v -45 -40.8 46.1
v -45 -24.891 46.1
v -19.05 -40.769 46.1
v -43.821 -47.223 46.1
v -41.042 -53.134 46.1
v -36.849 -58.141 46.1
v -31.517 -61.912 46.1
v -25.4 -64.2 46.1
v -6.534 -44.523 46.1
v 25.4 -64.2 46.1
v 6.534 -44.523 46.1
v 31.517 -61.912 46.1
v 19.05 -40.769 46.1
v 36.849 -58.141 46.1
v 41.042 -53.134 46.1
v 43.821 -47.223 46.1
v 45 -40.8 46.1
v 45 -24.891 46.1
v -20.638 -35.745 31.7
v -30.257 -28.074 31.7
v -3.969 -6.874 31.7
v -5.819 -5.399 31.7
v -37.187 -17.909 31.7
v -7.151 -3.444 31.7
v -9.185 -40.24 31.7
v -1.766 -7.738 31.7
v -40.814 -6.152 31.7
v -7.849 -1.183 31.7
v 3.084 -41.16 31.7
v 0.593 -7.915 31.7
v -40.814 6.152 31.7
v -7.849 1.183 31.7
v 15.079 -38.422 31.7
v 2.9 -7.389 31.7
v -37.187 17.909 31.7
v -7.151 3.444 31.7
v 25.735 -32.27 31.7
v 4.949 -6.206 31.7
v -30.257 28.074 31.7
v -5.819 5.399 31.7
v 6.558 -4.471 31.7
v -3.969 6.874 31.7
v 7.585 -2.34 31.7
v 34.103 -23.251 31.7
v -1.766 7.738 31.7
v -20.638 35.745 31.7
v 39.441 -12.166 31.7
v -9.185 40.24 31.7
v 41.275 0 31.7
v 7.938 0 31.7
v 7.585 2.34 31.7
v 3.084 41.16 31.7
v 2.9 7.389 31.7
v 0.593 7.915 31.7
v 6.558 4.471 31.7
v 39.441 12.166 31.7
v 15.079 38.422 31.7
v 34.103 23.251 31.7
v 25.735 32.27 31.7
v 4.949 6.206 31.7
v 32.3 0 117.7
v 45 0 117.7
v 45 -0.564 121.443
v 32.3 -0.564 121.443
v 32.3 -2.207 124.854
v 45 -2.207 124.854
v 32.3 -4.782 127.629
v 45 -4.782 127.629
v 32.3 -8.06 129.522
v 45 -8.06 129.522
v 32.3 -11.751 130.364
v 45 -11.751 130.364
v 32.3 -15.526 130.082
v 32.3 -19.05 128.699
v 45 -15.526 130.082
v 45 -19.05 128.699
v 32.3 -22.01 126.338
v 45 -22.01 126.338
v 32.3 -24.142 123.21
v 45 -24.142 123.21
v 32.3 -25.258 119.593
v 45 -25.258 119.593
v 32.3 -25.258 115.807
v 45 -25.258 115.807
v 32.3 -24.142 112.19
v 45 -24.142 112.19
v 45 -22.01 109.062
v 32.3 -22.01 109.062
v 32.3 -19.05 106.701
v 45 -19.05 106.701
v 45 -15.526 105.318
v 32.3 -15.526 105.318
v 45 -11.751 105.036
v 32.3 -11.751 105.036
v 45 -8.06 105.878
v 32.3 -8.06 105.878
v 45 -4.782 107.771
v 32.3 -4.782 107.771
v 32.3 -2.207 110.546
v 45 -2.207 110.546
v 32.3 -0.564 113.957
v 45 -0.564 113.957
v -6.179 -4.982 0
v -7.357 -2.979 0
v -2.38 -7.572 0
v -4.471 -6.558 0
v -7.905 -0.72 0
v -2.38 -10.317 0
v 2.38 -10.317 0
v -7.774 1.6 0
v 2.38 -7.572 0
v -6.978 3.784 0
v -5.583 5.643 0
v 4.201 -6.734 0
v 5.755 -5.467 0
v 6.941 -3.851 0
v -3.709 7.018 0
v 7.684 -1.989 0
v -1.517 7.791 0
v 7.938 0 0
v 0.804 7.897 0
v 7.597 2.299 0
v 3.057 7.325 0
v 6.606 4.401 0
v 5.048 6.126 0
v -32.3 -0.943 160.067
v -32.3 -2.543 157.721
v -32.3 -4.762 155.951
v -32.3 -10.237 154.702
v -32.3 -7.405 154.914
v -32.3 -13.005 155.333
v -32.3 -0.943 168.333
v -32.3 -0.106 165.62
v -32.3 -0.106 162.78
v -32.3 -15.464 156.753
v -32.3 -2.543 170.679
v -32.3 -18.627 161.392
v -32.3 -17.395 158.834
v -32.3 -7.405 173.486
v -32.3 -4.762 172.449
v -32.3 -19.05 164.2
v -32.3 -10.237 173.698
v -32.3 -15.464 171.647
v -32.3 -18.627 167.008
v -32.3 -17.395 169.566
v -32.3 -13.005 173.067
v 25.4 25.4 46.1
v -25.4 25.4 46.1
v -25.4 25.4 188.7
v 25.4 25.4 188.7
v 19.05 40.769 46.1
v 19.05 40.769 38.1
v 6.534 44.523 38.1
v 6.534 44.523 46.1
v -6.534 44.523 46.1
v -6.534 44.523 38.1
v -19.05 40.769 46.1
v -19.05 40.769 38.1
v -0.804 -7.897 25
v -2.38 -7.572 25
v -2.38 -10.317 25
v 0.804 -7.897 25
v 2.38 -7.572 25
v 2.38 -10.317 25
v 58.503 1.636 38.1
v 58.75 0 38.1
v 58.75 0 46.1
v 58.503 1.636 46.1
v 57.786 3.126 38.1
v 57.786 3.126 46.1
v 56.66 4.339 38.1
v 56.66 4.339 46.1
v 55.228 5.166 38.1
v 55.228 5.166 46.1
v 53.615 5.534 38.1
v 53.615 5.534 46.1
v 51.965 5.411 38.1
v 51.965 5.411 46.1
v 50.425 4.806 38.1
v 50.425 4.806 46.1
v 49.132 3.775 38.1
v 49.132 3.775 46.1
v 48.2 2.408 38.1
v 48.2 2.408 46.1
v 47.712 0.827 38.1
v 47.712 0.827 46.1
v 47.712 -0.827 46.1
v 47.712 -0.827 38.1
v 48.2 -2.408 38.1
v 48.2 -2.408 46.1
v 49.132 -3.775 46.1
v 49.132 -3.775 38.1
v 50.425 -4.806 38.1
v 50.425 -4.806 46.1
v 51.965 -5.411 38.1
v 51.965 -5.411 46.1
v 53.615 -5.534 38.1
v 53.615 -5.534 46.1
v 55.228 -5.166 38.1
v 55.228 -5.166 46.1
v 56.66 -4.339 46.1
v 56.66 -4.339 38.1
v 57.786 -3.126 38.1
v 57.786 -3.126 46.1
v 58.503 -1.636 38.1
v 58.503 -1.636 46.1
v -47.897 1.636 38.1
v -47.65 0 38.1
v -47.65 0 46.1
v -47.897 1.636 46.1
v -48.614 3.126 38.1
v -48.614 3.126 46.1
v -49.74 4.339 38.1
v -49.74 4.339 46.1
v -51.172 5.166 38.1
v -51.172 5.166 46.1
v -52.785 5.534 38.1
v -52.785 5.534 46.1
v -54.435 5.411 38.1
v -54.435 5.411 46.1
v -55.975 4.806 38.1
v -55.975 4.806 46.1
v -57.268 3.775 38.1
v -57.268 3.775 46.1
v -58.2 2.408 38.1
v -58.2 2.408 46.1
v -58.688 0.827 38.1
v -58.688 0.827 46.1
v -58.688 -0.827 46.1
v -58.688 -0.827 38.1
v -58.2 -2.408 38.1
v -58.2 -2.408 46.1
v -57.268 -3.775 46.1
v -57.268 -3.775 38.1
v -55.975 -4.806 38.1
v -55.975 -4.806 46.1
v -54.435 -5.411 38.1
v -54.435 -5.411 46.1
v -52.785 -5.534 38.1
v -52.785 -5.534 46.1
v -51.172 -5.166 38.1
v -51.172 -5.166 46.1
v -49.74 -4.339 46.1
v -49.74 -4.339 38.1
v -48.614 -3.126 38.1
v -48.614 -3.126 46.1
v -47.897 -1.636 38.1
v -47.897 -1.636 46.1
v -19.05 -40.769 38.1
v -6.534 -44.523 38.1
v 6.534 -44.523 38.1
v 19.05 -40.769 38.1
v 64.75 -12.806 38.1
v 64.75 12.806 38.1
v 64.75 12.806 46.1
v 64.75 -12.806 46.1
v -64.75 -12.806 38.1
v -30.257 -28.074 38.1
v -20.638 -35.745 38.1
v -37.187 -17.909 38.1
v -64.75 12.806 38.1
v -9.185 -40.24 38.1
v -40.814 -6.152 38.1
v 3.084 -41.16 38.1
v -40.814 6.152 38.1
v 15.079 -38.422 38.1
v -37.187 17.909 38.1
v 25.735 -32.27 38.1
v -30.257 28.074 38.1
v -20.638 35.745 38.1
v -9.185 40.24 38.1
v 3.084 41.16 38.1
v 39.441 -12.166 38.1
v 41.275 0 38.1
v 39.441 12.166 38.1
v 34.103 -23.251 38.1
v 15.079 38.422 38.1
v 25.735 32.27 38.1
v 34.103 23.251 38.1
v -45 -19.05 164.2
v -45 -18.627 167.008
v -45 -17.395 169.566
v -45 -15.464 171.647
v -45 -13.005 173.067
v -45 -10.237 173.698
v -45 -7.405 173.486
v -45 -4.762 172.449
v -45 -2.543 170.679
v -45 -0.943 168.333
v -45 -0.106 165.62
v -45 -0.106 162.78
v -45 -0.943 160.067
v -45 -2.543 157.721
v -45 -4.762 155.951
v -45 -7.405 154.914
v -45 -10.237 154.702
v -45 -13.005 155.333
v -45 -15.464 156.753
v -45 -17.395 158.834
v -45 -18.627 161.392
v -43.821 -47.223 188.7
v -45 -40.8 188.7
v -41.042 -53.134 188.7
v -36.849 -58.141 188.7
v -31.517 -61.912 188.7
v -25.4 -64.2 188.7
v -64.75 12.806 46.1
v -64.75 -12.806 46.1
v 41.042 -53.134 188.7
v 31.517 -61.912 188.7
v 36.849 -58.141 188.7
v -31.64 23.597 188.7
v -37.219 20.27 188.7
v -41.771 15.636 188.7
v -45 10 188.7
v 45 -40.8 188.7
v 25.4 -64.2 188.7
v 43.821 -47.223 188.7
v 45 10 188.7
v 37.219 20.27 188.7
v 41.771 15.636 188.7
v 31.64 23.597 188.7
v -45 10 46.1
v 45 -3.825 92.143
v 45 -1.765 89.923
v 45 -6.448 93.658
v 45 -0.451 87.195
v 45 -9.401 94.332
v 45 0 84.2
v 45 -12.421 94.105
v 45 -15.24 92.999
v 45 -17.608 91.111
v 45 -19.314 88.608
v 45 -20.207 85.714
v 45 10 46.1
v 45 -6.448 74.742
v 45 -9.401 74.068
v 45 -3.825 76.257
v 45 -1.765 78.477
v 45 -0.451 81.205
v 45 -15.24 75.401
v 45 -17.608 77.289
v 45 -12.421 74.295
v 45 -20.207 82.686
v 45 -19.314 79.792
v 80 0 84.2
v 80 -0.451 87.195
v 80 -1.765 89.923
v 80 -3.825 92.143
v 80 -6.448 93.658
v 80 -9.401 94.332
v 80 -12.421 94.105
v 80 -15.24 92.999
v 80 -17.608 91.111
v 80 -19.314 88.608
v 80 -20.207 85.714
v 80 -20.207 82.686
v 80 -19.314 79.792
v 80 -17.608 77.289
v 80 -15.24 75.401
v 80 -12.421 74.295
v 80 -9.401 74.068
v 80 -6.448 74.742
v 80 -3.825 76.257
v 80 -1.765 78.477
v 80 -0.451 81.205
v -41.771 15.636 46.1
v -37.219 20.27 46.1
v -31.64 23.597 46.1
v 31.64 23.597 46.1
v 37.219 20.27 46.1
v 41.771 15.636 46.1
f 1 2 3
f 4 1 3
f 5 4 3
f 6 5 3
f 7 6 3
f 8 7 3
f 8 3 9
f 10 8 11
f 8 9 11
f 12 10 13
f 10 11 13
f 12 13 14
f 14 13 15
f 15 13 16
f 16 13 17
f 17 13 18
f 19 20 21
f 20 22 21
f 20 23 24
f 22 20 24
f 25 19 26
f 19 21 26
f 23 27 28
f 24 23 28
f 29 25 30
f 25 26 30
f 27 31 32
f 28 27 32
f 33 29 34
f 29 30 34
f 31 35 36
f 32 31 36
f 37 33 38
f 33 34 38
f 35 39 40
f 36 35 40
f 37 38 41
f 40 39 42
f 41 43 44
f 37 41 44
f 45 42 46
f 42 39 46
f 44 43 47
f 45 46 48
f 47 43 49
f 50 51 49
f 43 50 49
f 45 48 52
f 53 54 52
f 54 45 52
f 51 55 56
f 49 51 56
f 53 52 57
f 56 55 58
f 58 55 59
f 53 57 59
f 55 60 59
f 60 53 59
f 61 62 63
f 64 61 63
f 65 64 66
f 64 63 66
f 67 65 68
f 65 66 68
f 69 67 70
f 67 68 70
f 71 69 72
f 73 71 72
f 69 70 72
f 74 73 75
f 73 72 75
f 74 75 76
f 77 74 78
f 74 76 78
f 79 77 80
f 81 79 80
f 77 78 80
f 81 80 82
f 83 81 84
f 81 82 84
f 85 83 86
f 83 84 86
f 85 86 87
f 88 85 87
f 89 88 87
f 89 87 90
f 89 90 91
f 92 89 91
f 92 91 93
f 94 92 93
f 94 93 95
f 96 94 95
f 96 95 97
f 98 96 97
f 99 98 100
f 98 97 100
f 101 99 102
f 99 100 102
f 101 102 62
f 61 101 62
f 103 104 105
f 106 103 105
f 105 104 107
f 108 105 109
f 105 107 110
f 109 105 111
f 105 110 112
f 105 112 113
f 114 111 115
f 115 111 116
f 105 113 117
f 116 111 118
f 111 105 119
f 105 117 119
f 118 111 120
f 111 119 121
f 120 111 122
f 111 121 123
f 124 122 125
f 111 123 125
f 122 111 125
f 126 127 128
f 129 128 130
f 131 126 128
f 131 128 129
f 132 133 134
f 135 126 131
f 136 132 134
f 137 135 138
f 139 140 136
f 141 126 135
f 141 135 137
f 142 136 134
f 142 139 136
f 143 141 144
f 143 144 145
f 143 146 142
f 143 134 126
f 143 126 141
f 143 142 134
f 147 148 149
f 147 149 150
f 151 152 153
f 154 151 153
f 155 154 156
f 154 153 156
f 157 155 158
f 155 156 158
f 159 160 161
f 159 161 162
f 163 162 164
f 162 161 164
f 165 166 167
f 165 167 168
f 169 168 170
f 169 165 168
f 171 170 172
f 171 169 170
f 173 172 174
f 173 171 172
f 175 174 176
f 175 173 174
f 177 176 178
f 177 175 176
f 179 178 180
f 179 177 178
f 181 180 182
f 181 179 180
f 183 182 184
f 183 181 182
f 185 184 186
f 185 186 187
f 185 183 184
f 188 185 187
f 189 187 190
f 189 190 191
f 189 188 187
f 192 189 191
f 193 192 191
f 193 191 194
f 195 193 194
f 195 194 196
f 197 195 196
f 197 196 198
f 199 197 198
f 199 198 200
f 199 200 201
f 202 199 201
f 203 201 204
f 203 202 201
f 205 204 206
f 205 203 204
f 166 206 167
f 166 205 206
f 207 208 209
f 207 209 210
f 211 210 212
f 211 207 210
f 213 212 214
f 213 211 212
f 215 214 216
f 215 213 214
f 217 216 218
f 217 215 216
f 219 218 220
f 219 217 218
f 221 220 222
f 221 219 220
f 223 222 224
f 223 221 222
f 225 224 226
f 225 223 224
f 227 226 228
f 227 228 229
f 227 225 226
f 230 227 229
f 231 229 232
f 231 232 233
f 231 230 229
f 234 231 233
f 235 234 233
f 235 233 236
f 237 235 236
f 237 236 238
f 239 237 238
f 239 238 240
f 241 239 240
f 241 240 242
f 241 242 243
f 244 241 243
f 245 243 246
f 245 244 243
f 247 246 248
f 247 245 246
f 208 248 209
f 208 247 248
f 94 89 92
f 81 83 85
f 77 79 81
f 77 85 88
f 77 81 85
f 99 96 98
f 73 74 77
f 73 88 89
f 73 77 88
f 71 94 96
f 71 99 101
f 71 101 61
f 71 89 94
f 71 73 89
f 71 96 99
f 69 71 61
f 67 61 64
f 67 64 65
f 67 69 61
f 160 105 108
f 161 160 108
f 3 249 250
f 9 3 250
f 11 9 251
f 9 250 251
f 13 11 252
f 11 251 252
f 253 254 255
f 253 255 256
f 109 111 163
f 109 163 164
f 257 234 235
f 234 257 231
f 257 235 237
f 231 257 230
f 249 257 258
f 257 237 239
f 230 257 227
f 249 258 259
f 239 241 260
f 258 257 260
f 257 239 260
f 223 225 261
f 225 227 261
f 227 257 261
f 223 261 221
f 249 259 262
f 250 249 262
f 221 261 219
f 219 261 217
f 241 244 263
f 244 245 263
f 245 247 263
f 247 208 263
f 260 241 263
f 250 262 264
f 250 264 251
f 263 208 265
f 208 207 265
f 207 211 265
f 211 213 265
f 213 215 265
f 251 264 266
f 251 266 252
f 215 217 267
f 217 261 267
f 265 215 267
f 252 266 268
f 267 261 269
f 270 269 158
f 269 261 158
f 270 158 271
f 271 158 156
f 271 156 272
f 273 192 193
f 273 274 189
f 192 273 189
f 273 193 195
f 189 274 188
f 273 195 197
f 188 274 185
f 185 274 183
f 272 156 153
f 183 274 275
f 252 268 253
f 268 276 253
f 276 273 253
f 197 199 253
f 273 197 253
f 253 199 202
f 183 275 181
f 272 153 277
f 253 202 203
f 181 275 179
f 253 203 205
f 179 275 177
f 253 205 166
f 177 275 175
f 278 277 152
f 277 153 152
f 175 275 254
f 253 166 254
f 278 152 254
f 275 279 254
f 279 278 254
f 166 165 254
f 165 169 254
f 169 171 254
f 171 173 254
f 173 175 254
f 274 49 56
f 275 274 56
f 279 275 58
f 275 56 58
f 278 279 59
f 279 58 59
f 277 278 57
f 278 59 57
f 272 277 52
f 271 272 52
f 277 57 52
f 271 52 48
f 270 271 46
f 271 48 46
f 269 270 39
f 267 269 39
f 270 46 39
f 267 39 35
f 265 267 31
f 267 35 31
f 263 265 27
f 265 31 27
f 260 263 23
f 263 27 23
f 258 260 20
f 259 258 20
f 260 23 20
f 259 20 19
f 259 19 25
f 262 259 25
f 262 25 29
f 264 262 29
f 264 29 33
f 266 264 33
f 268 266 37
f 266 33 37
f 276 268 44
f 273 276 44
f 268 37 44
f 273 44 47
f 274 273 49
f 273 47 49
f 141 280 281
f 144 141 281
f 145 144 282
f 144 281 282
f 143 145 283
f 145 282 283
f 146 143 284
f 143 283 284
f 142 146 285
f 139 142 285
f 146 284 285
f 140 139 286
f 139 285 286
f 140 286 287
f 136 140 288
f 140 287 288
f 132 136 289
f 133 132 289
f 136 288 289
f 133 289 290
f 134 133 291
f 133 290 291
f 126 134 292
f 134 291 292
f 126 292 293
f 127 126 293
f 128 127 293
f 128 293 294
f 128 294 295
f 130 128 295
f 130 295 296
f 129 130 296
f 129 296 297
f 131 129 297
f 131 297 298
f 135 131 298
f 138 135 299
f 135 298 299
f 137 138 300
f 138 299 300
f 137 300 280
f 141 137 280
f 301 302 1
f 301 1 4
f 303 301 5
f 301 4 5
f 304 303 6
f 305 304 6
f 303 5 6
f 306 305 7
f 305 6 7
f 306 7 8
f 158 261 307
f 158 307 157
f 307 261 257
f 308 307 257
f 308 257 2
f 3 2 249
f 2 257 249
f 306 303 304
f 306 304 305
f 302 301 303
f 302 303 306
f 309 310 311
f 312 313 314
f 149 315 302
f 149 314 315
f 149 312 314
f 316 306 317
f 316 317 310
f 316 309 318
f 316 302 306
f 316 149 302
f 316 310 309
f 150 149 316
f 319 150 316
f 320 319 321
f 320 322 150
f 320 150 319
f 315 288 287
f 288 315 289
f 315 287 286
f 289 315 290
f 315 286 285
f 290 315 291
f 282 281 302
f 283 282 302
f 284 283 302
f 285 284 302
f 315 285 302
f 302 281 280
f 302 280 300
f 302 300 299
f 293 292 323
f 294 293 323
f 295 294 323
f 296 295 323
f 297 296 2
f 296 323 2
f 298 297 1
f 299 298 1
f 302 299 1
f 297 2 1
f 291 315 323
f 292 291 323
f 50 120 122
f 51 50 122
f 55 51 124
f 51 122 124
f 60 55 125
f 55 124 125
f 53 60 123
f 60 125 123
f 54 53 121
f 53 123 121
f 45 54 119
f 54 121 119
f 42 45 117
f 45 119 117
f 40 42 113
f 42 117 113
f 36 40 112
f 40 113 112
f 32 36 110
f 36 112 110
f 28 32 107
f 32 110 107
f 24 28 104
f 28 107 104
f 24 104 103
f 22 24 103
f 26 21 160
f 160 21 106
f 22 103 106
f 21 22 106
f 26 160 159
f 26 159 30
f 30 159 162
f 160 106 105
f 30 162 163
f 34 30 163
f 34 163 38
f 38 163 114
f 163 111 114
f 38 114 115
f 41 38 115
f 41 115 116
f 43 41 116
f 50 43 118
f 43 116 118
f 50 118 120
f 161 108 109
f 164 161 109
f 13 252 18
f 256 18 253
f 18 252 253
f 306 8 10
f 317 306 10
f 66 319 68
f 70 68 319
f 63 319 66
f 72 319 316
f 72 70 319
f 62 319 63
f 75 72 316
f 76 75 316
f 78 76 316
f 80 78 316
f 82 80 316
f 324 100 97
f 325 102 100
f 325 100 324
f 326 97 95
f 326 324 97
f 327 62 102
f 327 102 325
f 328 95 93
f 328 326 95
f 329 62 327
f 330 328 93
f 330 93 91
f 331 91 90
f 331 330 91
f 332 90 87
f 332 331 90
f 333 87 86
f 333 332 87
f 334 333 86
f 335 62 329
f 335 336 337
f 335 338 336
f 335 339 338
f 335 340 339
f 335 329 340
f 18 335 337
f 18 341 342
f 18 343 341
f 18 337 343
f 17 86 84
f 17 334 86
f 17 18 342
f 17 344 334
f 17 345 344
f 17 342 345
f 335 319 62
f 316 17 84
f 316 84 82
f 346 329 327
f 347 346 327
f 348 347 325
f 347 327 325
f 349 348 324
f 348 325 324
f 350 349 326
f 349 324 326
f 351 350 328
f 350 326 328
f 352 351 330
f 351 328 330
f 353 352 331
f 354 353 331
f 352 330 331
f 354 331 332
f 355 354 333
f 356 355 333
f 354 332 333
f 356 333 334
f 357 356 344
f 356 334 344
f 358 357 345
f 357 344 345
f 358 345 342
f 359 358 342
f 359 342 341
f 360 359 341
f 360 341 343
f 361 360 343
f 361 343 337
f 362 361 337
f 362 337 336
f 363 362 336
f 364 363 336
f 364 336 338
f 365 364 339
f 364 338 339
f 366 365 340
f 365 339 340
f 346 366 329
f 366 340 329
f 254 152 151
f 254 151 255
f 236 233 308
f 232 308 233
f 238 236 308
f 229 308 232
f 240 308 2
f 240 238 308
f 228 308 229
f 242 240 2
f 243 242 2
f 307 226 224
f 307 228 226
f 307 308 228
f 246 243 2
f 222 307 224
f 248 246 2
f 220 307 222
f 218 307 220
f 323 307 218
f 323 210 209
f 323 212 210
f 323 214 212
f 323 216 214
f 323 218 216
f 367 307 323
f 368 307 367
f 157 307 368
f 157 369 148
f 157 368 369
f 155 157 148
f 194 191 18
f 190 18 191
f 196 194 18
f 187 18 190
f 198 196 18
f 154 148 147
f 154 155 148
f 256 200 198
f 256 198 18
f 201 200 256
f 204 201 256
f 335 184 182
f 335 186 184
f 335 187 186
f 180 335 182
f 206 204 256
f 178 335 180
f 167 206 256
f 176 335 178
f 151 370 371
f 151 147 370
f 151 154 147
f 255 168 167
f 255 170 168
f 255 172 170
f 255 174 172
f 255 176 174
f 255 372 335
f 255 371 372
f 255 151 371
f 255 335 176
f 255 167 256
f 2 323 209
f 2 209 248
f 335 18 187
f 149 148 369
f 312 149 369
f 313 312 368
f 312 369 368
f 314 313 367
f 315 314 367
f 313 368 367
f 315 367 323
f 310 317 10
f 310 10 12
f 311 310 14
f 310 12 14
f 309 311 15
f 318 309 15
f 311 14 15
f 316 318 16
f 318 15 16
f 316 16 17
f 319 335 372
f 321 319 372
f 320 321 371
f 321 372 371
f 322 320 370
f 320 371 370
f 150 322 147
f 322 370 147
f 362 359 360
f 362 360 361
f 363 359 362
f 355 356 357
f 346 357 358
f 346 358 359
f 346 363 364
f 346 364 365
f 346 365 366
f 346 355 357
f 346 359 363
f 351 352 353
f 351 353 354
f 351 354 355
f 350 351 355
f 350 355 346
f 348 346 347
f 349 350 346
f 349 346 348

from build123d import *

# Parameters (mm, degrees)
SKETCH_R        = 7.9375
PAD_DEPTH       = 31.7
SKETCH001_W     = 4.76
SKETCH001_H     = 4.76
PAD001_DEPTH    = 25
SKETCH002_R     = 41.275
PAD002_DEPTH    = 6.4
SKETCH003_R     = 5.55
PAD003_DEPTH    = 8
PAD004_DEPTH    = 142.6
SKETCH005_R     = 12.7
POCKET_DEPTH    = 12.7
SKETCH006_R     = 10.16
PAD005_DEPTH    = 35
SKETCH007_R     = 9.525
POCKET001_DEPTH = 12.7


with BuildPart() as part:
    # Sketch → Pad (new body)
    with BuildSketch(Plane.XY):
        Circle(SKETCH_R)
    extrude(amount=PAD_DEPTH)

    # Sketch001 → Pad001 (new body)
    with BuildSketch(Plane(origin=(0, 0, 0), x_dir=(1, 0, 0), z_dir=(0, 0, -1))):
        with Locations((0, 7.9375)):
            Rectangle(SKETCH001_W, SKETCH001_H)
    extrude(amount=-PAD001_DEPTH)

    # Sketch002 → Pad002 (new body)
    with BuildSketch(Plane.XY.offset(31.7)):
        Circle(SKETCH002_R)
    extrude(amount=PAD002_DEPTH)

    # Sketch003 → Pad003 (new body)
    with BuildSketch(Plane.XY.offset(38.1)):
        with BuildLine():
            Line((-64.75, 12.806207), (-64.75, -12.806207))
            Line((-64.75, -12.806207), (-19.05, -40.76883))
            ThreePointArc((-19.05, -40.76883), (0, -45), (19.05, -40.76883))
            Line((19.05, -40.76883), (64.75, -12.806207))
            Line((64.75, 12.806207), (64.75, -12.806207))
            Line((19.05, 40.76883), (64.75, 12.806207))
            ThreePointArc((19.05, 40.76883), (0, 45), (-19.05, 40.76883))
            Line((-64.75, 12.806207), (-19.05, 40.76883))
        make_face()
        with Locations((-53.2, 0)):
            Circle(SKETCH003_R, mode=Mode.SUBTRACT)
        with Locations((53.2, 0)):
            Circle(SKETCH003_R, mode=Mode.SUBTRACT)
    extrude(amount=PAD003_DEPTH)

    # Sketch004 → Pad004 (new body)
    with BuildSketch(Plane.XY.offset(46.1)):
        with BuildLine():
            Line((-45, 10), (-45, -40.8))
            ThreePointArc((-45, -40.8), (-39.107056, -55.772577), (-25.4, -64.2))
            Line((-25.4, -64.2), (25.4, -64.2))
            ThreePointArc((25.4, -64.2), (39.107056, -55.772577), (45, -40.8))
            Line((45, 10), (45, -40.8))
            ThreePointArc((45, 10), (37.218977, 20.269607), (25.4, 25.4))
            Line((-25.4, 25.4), (25.4, 25.4))
            ThreePointArc((-25.4, 25.4), (-37.218977, 20.269607), (-45, 10))
        make_face()
    extrude(amount=PAD004_DEPTH)

    # Sketch005 → Pocket (cut)
    with BuildSketch(Plane.YZ.offset(45)):
        with Locations((-12.7, 117.7)):
            Circle(SKETCH005_R)
    extrude(amount=-POCKET_DEPTH, mode=Mode.SUBTRACT)

    # Sketch006 → Pad005 (new body)
    with BuildSketch(Plane.YZ.offset(45)):
        with Locations((-10.16, 84.2)):
            Circle(SKETCH006_R)
    extrude(amount=PAD005_DEPTH)

    # Sketch007 → Pocket001 (cut)
    with BuildSketch(Plane(origin=(-45, 0, 0), x_dir=(0, -1, 0), z_dir=(-1, 0, 0))):
        with Locations((9.525, 164.2)):
            Circle(SKETCH007_R)
    extrude(amount=-POCKET001_DEPTH, mode=Mode.SUBTRACT)


solid = part.part
